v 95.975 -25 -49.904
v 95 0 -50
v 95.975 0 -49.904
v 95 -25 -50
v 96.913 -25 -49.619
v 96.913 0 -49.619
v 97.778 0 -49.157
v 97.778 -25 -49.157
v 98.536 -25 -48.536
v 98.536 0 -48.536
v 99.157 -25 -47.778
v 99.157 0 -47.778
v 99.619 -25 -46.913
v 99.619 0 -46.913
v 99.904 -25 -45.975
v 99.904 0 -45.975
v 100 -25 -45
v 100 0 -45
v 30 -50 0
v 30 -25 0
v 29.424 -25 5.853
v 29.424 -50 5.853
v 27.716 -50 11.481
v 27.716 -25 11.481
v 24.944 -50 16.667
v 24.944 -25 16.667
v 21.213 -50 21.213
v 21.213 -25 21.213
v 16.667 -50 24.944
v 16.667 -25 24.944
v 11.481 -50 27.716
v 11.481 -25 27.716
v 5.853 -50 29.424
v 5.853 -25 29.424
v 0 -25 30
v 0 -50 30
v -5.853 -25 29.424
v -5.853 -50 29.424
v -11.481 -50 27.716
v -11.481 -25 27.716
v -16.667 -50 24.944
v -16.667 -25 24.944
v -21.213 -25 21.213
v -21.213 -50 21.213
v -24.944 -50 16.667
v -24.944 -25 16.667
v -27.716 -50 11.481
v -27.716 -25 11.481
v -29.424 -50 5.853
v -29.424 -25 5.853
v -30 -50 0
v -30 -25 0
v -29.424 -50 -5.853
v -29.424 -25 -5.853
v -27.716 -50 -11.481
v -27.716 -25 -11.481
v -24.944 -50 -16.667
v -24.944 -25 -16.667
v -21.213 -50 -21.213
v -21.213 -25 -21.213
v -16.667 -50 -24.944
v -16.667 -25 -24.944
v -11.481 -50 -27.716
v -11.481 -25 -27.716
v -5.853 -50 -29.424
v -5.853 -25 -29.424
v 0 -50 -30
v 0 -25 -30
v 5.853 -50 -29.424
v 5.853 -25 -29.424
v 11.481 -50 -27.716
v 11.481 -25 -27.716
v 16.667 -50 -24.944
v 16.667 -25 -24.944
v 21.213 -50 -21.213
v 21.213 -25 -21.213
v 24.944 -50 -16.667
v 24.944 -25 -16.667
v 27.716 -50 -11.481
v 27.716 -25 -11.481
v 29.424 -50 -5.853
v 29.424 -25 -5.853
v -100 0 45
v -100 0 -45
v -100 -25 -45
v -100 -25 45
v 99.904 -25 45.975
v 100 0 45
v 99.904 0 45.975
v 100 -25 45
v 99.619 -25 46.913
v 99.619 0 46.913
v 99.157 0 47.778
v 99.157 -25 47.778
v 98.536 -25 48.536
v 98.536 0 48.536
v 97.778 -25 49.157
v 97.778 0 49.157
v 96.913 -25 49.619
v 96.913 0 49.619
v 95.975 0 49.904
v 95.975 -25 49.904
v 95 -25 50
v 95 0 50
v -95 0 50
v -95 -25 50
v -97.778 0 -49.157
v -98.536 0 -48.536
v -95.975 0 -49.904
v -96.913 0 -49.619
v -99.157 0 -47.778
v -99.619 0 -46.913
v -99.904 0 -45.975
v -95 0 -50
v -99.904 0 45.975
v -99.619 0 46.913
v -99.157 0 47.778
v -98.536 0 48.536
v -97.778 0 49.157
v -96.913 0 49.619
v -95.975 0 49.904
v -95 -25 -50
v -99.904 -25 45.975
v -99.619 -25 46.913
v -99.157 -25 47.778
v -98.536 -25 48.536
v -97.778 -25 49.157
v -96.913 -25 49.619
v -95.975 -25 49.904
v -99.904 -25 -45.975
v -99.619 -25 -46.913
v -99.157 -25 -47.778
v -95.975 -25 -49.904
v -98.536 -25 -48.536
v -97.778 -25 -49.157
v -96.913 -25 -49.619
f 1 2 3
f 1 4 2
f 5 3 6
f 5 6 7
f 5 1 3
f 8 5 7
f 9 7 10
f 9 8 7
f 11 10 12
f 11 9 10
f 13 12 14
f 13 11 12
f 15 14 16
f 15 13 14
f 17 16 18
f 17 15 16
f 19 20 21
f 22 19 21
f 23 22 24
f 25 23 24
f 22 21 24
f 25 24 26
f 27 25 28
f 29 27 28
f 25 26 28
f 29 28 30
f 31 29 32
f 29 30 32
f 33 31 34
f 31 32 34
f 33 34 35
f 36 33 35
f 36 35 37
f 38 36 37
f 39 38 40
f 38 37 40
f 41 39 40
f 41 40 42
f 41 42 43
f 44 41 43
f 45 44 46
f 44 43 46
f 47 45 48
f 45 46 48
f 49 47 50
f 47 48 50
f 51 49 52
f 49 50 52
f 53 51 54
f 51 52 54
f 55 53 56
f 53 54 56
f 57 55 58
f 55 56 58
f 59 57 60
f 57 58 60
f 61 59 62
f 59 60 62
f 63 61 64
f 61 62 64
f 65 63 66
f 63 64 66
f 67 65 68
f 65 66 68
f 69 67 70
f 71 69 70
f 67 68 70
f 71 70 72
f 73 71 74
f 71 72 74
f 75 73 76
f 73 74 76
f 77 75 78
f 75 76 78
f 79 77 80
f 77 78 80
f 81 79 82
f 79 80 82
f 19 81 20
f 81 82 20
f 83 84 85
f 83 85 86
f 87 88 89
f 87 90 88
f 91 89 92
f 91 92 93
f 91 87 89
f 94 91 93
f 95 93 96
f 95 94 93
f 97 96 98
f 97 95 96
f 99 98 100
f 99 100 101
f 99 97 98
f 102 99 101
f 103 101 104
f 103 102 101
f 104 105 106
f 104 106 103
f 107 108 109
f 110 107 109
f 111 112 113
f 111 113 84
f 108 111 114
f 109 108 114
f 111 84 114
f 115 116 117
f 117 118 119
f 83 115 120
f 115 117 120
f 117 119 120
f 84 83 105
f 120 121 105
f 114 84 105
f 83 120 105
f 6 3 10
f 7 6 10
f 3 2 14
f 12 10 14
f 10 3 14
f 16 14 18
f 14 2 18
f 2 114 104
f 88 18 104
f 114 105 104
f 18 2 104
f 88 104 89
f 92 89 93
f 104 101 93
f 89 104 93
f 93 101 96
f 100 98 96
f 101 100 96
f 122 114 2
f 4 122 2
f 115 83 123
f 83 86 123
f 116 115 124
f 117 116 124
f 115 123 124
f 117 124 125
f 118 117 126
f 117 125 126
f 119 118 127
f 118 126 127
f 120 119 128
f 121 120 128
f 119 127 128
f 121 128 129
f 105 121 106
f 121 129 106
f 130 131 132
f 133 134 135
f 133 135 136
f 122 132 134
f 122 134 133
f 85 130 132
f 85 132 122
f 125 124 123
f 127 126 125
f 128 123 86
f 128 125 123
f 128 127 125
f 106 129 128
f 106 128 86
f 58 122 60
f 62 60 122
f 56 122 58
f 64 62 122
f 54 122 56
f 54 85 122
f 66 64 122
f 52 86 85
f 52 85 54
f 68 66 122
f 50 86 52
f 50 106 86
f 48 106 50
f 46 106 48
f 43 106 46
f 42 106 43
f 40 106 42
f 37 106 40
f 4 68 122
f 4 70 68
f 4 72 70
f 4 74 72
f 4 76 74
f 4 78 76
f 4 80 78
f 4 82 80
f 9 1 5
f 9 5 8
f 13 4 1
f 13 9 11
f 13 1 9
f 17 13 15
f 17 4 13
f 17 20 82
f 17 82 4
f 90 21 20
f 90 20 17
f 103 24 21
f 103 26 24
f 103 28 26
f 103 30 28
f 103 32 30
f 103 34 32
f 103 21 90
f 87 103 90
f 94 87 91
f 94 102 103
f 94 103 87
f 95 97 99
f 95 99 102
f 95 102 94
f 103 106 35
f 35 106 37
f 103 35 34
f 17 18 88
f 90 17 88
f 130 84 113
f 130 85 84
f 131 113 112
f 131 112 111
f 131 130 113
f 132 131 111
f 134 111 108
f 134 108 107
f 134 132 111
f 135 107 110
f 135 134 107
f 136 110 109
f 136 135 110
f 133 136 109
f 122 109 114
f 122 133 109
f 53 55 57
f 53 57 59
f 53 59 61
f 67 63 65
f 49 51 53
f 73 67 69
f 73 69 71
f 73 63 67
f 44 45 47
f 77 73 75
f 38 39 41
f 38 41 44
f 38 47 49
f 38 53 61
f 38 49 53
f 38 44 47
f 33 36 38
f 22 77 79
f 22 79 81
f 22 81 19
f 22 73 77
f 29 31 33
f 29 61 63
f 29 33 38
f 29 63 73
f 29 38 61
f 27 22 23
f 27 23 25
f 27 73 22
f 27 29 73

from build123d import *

# Parameters (mm, degrees)
F0_W     = 200
F0_H     = 100
F1_DEPTH = 25
F2_R     = 5
F3_R     = 30
F4_DEPTH = 25


with BuildPart() as f1:
    # F0 (on Front) → F1 (new body)
    with BuildSketch(Plane.XZ):
        Rectangle(F0_W, F0_H)
    extrude(amount=F1_DEPTH)

    # F2
    f2_edges = [f1.edges().sort_by_distance(p)[0] for p in [
        (-100, -12.5, -50),
        (100, -12.5, -50),
        (100, -12.5, 50),
        (-100, -12.5, 50),
    ]]
    fillet(f2_edges, radius=F2_R)

    # F3 (on face) → F4 (join)
    with BuildSketch(Plane.XZ.offset(25)):
        Circle(F3_R)
    extrude(amount=F4_DEPTH)


solid = f1.part
